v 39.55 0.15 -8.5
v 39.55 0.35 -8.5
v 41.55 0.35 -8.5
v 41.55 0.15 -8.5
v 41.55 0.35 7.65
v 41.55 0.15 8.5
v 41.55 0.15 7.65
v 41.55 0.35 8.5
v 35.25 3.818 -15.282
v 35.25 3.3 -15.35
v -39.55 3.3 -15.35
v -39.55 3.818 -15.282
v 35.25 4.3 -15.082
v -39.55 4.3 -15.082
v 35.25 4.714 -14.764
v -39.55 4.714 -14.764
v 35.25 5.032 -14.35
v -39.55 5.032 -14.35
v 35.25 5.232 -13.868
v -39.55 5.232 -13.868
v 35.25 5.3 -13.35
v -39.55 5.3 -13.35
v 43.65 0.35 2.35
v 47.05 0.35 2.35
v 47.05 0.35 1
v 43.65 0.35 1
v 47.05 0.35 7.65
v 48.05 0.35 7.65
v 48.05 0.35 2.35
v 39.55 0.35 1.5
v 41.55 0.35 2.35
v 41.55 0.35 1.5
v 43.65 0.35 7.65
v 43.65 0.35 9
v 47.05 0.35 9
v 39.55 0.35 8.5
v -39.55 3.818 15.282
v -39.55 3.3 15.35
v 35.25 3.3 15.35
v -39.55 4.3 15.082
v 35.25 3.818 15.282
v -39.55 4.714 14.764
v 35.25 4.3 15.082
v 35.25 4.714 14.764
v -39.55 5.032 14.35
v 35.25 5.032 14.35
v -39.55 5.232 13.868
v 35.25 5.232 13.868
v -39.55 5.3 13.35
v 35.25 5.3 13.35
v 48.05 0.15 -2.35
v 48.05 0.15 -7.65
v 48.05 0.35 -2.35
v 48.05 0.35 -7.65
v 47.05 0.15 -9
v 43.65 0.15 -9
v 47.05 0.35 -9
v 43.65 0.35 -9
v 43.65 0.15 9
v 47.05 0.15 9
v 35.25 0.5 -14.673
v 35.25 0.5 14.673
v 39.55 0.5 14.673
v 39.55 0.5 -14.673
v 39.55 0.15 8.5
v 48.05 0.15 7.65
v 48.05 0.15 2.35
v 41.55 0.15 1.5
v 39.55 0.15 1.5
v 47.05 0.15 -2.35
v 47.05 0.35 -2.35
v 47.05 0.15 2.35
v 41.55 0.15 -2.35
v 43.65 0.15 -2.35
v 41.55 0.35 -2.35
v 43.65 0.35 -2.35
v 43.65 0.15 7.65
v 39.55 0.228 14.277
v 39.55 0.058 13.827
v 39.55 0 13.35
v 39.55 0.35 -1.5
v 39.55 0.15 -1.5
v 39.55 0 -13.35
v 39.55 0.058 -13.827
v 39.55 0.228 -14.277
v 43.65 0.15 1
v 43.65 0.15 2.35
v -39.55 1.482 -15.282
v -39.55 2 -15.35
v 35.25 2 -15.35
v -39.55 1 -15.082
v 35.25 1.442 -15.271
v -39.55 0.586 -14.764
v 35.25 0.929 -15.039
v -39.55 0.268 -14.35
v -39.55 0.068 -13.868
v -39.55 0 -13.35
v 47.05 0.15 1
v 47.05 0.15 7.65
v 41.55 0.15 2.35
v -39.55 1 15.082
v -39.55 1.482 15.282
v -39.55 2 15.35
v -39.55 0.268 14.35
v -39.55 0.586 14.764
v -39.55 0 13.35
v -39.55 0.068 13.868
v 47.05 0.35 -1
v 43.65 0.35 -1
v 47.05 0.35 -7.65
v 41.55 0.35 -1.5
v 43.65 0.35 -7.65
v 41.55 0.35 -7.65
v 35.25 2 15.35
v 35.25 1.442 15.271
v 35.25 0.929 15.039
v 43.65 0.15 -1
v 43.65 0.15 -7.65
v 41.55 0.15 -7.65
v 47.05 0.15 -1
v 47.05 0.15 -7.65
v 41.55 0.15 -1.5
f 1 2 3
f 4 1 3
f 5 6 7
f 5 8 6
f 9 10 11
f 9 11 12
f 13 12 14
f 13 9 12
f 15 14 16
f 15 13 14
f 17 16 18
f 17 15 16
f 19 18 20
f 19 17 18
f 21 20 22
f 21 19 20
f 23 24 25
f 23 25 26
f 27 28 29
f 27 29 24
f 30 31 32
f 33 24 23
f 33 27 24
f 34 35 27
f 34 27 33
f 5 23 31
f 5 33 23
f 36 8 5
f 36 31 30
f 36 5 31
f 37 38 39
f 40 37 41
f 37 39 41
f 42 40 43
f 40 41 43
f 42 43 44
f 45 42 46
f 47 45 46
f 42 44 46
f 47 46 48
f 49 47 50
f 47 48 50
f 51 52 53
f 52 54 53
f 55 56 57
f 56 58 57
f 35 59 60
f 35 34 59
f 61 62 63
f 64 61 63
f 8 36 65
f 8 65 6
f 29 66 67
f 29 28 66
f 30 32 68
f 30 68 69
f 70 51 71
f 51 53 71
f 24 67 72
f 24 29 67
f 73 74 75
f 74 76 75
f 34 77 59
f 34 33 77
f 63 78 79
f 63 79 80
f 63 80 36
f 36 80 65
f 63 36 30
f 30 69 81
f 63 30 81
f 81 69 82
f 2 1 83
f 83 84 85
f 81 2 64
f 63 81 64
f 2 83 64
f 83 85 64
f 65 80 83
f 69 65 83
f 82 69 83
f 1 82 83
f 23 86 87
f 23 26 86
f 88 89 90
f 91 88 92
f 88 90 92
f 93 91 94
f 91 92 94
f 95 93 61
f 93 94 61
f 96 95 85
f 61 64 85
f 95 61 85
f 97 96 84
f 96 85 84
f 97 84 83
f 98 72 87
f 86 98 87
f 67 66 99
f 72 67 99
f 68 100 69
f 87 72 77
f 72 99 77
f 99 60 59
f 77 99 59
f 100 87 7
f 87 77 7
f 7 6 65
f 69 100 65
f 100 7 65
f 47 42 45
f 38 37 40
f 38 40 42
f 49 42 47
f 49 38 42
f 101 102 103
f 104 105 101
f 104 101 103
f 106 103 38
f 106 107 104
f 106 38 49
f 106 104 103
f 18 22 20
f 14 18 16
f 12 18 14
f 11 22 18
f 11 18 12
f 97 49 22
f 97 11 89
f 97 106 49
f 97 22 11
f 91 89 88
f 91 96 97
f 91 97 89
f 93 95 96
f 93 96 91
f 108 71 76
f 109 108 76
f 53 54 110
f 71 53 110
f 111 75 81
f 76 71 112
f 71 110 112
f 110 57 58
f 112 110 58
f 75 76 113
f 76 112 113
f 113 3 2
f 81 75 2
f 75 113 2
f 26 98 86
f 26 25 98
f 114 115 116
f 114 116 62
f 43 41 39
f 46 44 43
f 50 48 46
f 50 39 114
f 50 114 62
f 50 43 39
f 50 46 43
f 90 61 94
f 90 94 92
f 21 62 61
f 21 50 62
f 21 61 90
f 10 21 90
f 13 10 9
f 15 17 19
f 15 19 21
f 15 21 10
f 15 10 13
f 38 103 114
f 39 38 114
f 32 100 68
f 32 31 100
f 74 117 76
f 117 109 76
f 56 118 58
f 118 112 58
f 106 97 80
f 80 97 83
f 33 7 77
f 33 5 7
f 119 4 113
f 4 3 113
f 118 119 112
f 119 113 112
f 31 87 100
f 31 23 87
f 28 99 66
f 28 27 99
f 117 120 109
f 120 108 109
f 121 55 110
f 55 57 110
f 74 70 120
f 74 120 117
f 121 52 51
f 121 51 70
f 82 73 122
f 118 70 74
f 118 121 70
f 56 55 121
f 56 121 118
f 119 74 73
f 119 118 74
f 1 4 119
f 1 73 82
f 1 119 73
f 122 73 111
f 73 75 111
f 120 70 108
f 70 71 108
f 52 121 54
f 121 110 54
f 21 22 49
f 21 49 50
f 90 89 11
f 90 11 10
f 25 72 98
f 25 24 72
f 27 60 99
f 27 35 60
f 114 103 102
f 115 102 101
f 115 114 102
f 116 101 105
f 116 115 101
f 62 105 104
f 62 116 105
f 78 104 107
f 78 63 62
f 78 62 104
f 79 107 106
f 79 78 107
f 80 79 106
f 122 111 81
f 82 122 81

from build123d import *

# Parameters (mm, degrees)
SKETCH1_W           = 79.1
SKETCH1_H           = 30.7
BOSS_EXTRUDE1_DEPTH = 5.3
FILLET1_R           = 2
SKETCH2_W           = 4.3
SKETCH2_H           = 30.7
CUT_EXTRUDE1_DEPTH  = 4.8
BOSS_EXTRUDE2_DEPTH = 0.1


with BuildPart() as part:
    # Sketch1 → Boss-Extrude1 (new body)
    with BuildSketch(Plane(origin=(0, 0, 0), x_dir=(1, 0, 0), z_dir=(0, 1, 0))):
        Rectangle(SKETCH1_W, SKETCH1_H)
    extrude(amount=BOSS_EXTRUDE1_DEPTH)

    # Fillet1
    fillet1_edges = [part.edges().sort_by_distance(p)[0] for p in [
        (0, 5.3, -15.35),
        (0, 0, -15.35),
        (0, 0, 15.35),
        (0, 5.3, 15.35),
    ]]
    fillet(fillet1_edges, radius=FILLET1_R)

    # Sketch2 → Cut-Extrude1 (cut)
    with BuildSketch(Plane(origin=(0, 5.3, 0), x_dir=(1, 0, 0), z_dir=(0, 1, 0))):
        with Locations((37.4, 0)):
            Rectangle(SKETCH2_W, SKETCH2_H)
    extrude(amount=-CUT_EXTRUDE1_DEPTH, mode=Mode.SUBTRACT)

    # Sketch3 → Boss-Extrude2 (add, symmetric)
    with BuildSketch(Plane(origin=(0, 0.25, 0), x_dir=(1, 0, 0), z_dir=(0, 1, 0))):
        Polygon((39.55, 8.5), (41.55, 8.5), (41.55, 7.65), (43.65, 7.65), (43.65, 9), (47.05, 9), (47.05, 7.65), (48.05, 7.65), (48.05, 2.35), (47.05, 2.35), (47.05, 1), (43.65, 1), (43.65, 2.35), (41.55, 2.35), (41.55, 1.5), (39.55, 1.5), align=None)
    boss_extrude2 = extrude(amount=BOSS_EXTRUDE2_DEPTH, both=True)

    # Mirror1: Boss-Extrude2 across plane
    add(boss_extrude2.mirror(Plane.XY))


solid = part.part
